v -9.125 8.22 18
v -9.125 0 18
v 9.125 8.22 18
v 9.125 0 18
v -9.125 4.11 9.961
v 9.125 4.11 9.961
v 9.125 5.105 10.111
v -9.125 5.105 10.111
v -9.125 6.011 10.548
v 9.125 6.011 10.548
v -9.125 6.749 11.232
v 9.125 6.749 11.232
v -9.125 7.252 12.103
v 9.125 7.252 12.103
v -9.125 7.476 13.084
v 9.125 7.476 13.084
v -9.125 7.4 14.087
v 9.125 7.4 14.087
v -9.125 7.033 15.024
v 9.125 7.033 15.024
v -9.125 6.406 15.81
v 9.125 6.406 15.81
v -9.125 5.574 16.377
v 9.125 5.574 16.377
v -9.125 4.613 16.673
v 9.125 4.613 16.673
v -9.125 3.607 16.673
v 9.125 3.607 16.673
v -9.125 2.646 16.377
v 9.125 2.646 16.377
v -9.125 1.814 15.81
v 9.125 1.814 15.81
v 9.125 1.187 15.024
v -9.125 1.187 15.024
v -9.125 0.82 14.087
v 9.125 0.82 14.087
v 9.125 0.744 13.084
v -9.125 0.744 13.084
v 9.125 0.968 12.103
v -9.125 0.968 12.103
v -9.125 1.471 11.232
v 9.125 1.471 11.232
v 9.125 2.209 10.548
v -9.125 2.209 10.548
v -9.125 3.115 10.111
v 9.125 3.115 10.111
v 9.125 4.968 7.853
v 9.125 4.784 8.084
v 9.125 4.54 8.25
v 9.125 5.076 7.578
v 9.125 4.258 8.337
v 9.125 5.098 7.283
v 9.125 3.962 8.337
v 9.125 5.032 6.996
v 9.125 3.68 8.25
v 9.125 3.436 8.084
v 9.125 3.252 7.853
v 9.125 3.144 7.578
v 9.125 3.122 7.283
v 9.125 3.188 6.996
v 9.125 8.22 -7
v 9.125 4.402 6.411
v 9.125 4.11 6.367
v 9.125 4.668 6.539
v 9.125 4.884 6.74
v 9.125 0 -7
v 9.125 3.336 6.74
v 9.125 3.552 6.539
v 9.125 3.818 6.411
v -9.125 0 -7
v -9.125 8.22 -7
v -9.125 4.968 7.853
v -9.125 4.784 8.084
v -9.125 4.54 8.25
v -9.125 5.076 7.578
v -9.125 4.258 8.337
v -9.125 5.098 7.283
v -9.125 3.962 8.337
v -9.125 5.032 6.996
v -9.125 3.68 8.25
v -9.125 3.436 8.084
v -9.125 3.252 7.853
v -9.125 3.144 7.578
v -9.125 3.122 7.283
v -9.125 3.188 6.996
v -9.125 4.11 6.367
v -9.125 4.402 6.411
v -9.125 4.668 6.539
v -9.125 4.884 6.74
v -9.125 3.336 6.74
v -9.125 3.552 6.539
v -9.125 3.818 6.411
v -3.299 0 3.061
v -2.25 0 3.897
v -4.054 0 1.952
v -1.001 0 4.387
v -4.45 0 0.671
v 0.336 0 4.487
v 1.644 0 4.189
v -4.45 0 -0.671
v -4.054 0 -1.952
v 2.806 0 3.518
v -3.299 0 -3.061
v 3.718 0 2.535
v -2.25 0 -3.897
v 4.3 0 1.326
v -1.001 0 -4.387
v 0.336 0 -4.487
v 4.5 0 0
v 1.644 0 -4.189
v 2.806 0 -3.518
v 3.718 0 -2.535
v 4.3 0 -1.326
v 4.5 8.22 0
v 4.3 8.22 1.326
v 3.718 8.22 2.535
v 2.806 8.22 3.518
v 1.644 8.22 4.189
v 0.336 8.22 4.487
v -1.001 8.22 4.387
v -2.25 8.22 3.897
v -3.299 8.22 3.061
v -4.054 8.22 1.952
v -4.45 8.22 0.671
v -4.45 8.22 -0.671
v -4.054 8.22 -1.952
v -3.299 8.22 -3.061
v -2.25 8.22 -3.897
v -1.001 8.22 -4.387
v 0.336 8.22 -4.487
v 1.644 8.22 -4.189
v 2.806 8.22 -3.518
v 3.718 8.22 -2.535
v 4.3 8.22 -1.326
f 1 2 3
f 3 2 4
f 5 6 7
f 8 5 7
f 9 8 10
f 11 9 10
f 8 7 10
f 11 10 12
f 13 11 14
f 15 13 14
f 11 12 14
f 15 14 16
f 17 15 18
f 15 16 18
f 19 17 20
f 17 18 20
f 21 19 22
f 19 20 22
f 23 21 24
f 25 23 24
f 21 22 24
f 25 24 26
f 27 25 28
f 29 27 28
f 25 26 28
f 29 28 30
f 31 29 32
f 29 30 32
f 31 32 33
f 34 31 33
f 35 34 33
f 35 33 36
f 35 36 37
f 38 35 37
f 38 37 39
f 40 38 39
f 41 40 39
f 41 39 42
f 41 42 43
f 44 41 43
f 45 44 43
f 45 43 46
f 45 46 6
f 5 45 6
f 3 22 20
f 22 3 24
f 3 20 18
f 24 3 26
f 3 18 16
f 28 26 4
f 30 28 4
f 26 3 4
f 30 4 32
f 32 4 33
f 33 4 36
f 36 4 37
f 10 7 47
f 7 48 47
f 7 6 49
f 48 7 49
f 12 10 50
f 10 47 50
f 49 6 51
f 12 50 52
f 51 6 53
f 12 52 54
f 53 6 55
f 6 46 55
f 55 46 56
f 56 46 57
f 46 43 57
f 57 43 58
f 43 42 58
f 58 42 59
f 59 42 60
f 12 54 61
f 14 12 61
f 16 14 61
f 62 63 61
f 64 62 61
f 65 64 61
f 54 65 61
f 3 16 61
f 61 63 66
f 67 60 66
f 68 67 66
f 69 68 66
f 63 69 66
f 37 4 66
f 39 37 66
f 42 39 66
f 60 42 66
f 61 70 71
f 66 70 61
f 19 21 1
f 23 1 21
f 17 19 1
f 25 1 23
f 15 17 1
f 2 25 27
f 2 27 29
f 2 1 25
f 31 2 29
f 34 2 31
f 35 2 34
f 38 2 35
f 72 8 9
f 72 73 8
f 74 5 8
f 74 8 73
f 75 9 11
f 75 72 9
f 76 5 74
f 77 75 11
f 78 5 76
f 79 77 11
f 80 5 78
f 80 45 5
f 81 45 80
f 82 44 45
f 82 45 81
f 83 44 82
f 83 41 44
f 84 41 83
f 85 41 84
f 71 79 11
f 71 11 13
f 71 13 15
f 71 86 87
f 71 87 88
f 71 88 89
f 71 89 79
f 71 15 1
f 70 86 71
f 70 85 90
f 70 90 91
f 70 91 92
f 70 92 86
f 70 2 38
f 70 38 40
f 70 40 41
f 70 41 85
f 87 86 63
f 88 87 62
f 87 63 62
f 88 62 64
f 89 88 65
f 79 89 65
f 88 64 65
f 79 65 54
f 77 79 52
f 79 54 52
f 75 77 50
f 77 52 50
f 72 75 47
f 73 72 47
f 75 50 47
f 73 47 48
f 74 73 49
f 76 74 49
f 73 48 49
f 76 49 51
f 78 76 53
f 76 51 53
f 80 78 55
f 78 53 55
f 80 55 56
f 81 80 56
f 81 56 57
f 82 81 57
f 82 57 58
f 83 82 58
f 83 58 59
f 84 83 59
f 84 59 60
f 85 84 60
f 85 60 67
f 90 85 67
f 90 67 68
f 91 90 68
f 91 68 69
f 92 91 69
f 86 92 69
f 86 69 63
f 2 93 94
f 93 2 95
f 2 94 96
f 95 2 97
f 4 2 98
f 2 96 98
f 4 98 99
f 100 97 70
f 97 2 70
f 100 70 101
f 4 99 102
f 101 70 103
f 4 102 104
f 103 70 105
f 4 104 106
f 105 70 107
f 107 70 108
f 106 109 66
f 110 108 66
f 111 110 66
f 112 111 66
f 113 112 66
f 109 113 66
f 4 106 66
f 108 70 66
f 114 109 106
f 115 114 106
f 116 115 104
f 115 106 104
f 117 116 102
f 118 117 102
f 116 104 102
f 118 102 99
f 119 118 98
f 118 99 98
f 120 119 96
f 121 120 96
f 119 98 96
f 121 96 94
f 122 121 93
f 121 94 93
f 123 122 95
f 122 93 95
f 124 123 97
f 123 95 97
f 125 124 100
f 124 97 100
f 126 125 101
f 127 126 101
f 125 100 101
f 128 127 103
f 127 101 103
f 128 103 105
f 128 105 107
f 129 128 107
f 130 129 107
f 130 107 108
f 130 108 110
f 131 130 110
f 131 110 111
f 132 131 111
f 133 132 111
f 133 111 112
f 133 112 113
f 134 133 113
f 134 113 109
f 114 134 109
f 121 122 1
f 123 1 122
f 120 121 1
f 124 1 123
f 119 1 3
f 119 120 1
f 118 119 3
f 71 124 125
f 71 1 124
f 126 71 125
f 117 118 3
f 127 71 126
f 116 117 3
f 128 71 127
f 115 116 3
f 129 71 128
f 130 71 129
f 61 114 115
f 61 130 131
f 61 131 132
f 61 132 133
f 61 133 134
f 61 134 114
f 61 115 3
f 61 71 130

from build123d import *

# Parameters (mm, degrees)
SKETCH1_W              = 18.25
SKETCH1_H              = 25
BOSS_EXTRUDE1_DEPTH    = 8.22
M10X1_0_TAPPED_HOLE1_D = 9
SKETCH7_R              = 3.375
SKETCH7_R_2            = 0.9906
CUT_EXTRUDE2_DEPTH     = 19.25


with BuildPart() as part:
    # Sketch1 → Boss-Extrude1 (new body)
    with BuildSketch(Plane(origin=(0, 0, 0), x_dir=(1, 0, 0), z_dir=(0, 1, 0))):
        with Locations((0, -5.5)):
            Rectangle(SKETCH1_W, SKETCH1_H)
    extrude(amount=BOSS_EXTRUDE1_DEPTH)

    # M10x1.0 Tapped Hole1 (through all)
    with Locations(Plane(origin=(0, 8.22, 0), x_dir=(-1, 0, 0), z_dir=(0, 1, 0))):
        with Locations((0, 0)):
            Hole(M10X1_0_TAPPED_HOLE1_D / 2)

    # Sketch7 → Cut-Extrude2 (cut, through all)
    with BuildSketch(Plane(origin=(9.125, 0, 0), x_dir=(0, 0, -1), z_dir=(1, 0, 0))):
        with Locations((-13.336186812, 4.11)):
            Circle(SKETCH7_R)
        with Locations((-7.3575, 4.11)):
            Circle(SKETCH7_R_2)
    extrude(amount=-CUT_EXTRUDE2_DEPTH, mode=Mode.SUBTRACT)


solid = part.part
